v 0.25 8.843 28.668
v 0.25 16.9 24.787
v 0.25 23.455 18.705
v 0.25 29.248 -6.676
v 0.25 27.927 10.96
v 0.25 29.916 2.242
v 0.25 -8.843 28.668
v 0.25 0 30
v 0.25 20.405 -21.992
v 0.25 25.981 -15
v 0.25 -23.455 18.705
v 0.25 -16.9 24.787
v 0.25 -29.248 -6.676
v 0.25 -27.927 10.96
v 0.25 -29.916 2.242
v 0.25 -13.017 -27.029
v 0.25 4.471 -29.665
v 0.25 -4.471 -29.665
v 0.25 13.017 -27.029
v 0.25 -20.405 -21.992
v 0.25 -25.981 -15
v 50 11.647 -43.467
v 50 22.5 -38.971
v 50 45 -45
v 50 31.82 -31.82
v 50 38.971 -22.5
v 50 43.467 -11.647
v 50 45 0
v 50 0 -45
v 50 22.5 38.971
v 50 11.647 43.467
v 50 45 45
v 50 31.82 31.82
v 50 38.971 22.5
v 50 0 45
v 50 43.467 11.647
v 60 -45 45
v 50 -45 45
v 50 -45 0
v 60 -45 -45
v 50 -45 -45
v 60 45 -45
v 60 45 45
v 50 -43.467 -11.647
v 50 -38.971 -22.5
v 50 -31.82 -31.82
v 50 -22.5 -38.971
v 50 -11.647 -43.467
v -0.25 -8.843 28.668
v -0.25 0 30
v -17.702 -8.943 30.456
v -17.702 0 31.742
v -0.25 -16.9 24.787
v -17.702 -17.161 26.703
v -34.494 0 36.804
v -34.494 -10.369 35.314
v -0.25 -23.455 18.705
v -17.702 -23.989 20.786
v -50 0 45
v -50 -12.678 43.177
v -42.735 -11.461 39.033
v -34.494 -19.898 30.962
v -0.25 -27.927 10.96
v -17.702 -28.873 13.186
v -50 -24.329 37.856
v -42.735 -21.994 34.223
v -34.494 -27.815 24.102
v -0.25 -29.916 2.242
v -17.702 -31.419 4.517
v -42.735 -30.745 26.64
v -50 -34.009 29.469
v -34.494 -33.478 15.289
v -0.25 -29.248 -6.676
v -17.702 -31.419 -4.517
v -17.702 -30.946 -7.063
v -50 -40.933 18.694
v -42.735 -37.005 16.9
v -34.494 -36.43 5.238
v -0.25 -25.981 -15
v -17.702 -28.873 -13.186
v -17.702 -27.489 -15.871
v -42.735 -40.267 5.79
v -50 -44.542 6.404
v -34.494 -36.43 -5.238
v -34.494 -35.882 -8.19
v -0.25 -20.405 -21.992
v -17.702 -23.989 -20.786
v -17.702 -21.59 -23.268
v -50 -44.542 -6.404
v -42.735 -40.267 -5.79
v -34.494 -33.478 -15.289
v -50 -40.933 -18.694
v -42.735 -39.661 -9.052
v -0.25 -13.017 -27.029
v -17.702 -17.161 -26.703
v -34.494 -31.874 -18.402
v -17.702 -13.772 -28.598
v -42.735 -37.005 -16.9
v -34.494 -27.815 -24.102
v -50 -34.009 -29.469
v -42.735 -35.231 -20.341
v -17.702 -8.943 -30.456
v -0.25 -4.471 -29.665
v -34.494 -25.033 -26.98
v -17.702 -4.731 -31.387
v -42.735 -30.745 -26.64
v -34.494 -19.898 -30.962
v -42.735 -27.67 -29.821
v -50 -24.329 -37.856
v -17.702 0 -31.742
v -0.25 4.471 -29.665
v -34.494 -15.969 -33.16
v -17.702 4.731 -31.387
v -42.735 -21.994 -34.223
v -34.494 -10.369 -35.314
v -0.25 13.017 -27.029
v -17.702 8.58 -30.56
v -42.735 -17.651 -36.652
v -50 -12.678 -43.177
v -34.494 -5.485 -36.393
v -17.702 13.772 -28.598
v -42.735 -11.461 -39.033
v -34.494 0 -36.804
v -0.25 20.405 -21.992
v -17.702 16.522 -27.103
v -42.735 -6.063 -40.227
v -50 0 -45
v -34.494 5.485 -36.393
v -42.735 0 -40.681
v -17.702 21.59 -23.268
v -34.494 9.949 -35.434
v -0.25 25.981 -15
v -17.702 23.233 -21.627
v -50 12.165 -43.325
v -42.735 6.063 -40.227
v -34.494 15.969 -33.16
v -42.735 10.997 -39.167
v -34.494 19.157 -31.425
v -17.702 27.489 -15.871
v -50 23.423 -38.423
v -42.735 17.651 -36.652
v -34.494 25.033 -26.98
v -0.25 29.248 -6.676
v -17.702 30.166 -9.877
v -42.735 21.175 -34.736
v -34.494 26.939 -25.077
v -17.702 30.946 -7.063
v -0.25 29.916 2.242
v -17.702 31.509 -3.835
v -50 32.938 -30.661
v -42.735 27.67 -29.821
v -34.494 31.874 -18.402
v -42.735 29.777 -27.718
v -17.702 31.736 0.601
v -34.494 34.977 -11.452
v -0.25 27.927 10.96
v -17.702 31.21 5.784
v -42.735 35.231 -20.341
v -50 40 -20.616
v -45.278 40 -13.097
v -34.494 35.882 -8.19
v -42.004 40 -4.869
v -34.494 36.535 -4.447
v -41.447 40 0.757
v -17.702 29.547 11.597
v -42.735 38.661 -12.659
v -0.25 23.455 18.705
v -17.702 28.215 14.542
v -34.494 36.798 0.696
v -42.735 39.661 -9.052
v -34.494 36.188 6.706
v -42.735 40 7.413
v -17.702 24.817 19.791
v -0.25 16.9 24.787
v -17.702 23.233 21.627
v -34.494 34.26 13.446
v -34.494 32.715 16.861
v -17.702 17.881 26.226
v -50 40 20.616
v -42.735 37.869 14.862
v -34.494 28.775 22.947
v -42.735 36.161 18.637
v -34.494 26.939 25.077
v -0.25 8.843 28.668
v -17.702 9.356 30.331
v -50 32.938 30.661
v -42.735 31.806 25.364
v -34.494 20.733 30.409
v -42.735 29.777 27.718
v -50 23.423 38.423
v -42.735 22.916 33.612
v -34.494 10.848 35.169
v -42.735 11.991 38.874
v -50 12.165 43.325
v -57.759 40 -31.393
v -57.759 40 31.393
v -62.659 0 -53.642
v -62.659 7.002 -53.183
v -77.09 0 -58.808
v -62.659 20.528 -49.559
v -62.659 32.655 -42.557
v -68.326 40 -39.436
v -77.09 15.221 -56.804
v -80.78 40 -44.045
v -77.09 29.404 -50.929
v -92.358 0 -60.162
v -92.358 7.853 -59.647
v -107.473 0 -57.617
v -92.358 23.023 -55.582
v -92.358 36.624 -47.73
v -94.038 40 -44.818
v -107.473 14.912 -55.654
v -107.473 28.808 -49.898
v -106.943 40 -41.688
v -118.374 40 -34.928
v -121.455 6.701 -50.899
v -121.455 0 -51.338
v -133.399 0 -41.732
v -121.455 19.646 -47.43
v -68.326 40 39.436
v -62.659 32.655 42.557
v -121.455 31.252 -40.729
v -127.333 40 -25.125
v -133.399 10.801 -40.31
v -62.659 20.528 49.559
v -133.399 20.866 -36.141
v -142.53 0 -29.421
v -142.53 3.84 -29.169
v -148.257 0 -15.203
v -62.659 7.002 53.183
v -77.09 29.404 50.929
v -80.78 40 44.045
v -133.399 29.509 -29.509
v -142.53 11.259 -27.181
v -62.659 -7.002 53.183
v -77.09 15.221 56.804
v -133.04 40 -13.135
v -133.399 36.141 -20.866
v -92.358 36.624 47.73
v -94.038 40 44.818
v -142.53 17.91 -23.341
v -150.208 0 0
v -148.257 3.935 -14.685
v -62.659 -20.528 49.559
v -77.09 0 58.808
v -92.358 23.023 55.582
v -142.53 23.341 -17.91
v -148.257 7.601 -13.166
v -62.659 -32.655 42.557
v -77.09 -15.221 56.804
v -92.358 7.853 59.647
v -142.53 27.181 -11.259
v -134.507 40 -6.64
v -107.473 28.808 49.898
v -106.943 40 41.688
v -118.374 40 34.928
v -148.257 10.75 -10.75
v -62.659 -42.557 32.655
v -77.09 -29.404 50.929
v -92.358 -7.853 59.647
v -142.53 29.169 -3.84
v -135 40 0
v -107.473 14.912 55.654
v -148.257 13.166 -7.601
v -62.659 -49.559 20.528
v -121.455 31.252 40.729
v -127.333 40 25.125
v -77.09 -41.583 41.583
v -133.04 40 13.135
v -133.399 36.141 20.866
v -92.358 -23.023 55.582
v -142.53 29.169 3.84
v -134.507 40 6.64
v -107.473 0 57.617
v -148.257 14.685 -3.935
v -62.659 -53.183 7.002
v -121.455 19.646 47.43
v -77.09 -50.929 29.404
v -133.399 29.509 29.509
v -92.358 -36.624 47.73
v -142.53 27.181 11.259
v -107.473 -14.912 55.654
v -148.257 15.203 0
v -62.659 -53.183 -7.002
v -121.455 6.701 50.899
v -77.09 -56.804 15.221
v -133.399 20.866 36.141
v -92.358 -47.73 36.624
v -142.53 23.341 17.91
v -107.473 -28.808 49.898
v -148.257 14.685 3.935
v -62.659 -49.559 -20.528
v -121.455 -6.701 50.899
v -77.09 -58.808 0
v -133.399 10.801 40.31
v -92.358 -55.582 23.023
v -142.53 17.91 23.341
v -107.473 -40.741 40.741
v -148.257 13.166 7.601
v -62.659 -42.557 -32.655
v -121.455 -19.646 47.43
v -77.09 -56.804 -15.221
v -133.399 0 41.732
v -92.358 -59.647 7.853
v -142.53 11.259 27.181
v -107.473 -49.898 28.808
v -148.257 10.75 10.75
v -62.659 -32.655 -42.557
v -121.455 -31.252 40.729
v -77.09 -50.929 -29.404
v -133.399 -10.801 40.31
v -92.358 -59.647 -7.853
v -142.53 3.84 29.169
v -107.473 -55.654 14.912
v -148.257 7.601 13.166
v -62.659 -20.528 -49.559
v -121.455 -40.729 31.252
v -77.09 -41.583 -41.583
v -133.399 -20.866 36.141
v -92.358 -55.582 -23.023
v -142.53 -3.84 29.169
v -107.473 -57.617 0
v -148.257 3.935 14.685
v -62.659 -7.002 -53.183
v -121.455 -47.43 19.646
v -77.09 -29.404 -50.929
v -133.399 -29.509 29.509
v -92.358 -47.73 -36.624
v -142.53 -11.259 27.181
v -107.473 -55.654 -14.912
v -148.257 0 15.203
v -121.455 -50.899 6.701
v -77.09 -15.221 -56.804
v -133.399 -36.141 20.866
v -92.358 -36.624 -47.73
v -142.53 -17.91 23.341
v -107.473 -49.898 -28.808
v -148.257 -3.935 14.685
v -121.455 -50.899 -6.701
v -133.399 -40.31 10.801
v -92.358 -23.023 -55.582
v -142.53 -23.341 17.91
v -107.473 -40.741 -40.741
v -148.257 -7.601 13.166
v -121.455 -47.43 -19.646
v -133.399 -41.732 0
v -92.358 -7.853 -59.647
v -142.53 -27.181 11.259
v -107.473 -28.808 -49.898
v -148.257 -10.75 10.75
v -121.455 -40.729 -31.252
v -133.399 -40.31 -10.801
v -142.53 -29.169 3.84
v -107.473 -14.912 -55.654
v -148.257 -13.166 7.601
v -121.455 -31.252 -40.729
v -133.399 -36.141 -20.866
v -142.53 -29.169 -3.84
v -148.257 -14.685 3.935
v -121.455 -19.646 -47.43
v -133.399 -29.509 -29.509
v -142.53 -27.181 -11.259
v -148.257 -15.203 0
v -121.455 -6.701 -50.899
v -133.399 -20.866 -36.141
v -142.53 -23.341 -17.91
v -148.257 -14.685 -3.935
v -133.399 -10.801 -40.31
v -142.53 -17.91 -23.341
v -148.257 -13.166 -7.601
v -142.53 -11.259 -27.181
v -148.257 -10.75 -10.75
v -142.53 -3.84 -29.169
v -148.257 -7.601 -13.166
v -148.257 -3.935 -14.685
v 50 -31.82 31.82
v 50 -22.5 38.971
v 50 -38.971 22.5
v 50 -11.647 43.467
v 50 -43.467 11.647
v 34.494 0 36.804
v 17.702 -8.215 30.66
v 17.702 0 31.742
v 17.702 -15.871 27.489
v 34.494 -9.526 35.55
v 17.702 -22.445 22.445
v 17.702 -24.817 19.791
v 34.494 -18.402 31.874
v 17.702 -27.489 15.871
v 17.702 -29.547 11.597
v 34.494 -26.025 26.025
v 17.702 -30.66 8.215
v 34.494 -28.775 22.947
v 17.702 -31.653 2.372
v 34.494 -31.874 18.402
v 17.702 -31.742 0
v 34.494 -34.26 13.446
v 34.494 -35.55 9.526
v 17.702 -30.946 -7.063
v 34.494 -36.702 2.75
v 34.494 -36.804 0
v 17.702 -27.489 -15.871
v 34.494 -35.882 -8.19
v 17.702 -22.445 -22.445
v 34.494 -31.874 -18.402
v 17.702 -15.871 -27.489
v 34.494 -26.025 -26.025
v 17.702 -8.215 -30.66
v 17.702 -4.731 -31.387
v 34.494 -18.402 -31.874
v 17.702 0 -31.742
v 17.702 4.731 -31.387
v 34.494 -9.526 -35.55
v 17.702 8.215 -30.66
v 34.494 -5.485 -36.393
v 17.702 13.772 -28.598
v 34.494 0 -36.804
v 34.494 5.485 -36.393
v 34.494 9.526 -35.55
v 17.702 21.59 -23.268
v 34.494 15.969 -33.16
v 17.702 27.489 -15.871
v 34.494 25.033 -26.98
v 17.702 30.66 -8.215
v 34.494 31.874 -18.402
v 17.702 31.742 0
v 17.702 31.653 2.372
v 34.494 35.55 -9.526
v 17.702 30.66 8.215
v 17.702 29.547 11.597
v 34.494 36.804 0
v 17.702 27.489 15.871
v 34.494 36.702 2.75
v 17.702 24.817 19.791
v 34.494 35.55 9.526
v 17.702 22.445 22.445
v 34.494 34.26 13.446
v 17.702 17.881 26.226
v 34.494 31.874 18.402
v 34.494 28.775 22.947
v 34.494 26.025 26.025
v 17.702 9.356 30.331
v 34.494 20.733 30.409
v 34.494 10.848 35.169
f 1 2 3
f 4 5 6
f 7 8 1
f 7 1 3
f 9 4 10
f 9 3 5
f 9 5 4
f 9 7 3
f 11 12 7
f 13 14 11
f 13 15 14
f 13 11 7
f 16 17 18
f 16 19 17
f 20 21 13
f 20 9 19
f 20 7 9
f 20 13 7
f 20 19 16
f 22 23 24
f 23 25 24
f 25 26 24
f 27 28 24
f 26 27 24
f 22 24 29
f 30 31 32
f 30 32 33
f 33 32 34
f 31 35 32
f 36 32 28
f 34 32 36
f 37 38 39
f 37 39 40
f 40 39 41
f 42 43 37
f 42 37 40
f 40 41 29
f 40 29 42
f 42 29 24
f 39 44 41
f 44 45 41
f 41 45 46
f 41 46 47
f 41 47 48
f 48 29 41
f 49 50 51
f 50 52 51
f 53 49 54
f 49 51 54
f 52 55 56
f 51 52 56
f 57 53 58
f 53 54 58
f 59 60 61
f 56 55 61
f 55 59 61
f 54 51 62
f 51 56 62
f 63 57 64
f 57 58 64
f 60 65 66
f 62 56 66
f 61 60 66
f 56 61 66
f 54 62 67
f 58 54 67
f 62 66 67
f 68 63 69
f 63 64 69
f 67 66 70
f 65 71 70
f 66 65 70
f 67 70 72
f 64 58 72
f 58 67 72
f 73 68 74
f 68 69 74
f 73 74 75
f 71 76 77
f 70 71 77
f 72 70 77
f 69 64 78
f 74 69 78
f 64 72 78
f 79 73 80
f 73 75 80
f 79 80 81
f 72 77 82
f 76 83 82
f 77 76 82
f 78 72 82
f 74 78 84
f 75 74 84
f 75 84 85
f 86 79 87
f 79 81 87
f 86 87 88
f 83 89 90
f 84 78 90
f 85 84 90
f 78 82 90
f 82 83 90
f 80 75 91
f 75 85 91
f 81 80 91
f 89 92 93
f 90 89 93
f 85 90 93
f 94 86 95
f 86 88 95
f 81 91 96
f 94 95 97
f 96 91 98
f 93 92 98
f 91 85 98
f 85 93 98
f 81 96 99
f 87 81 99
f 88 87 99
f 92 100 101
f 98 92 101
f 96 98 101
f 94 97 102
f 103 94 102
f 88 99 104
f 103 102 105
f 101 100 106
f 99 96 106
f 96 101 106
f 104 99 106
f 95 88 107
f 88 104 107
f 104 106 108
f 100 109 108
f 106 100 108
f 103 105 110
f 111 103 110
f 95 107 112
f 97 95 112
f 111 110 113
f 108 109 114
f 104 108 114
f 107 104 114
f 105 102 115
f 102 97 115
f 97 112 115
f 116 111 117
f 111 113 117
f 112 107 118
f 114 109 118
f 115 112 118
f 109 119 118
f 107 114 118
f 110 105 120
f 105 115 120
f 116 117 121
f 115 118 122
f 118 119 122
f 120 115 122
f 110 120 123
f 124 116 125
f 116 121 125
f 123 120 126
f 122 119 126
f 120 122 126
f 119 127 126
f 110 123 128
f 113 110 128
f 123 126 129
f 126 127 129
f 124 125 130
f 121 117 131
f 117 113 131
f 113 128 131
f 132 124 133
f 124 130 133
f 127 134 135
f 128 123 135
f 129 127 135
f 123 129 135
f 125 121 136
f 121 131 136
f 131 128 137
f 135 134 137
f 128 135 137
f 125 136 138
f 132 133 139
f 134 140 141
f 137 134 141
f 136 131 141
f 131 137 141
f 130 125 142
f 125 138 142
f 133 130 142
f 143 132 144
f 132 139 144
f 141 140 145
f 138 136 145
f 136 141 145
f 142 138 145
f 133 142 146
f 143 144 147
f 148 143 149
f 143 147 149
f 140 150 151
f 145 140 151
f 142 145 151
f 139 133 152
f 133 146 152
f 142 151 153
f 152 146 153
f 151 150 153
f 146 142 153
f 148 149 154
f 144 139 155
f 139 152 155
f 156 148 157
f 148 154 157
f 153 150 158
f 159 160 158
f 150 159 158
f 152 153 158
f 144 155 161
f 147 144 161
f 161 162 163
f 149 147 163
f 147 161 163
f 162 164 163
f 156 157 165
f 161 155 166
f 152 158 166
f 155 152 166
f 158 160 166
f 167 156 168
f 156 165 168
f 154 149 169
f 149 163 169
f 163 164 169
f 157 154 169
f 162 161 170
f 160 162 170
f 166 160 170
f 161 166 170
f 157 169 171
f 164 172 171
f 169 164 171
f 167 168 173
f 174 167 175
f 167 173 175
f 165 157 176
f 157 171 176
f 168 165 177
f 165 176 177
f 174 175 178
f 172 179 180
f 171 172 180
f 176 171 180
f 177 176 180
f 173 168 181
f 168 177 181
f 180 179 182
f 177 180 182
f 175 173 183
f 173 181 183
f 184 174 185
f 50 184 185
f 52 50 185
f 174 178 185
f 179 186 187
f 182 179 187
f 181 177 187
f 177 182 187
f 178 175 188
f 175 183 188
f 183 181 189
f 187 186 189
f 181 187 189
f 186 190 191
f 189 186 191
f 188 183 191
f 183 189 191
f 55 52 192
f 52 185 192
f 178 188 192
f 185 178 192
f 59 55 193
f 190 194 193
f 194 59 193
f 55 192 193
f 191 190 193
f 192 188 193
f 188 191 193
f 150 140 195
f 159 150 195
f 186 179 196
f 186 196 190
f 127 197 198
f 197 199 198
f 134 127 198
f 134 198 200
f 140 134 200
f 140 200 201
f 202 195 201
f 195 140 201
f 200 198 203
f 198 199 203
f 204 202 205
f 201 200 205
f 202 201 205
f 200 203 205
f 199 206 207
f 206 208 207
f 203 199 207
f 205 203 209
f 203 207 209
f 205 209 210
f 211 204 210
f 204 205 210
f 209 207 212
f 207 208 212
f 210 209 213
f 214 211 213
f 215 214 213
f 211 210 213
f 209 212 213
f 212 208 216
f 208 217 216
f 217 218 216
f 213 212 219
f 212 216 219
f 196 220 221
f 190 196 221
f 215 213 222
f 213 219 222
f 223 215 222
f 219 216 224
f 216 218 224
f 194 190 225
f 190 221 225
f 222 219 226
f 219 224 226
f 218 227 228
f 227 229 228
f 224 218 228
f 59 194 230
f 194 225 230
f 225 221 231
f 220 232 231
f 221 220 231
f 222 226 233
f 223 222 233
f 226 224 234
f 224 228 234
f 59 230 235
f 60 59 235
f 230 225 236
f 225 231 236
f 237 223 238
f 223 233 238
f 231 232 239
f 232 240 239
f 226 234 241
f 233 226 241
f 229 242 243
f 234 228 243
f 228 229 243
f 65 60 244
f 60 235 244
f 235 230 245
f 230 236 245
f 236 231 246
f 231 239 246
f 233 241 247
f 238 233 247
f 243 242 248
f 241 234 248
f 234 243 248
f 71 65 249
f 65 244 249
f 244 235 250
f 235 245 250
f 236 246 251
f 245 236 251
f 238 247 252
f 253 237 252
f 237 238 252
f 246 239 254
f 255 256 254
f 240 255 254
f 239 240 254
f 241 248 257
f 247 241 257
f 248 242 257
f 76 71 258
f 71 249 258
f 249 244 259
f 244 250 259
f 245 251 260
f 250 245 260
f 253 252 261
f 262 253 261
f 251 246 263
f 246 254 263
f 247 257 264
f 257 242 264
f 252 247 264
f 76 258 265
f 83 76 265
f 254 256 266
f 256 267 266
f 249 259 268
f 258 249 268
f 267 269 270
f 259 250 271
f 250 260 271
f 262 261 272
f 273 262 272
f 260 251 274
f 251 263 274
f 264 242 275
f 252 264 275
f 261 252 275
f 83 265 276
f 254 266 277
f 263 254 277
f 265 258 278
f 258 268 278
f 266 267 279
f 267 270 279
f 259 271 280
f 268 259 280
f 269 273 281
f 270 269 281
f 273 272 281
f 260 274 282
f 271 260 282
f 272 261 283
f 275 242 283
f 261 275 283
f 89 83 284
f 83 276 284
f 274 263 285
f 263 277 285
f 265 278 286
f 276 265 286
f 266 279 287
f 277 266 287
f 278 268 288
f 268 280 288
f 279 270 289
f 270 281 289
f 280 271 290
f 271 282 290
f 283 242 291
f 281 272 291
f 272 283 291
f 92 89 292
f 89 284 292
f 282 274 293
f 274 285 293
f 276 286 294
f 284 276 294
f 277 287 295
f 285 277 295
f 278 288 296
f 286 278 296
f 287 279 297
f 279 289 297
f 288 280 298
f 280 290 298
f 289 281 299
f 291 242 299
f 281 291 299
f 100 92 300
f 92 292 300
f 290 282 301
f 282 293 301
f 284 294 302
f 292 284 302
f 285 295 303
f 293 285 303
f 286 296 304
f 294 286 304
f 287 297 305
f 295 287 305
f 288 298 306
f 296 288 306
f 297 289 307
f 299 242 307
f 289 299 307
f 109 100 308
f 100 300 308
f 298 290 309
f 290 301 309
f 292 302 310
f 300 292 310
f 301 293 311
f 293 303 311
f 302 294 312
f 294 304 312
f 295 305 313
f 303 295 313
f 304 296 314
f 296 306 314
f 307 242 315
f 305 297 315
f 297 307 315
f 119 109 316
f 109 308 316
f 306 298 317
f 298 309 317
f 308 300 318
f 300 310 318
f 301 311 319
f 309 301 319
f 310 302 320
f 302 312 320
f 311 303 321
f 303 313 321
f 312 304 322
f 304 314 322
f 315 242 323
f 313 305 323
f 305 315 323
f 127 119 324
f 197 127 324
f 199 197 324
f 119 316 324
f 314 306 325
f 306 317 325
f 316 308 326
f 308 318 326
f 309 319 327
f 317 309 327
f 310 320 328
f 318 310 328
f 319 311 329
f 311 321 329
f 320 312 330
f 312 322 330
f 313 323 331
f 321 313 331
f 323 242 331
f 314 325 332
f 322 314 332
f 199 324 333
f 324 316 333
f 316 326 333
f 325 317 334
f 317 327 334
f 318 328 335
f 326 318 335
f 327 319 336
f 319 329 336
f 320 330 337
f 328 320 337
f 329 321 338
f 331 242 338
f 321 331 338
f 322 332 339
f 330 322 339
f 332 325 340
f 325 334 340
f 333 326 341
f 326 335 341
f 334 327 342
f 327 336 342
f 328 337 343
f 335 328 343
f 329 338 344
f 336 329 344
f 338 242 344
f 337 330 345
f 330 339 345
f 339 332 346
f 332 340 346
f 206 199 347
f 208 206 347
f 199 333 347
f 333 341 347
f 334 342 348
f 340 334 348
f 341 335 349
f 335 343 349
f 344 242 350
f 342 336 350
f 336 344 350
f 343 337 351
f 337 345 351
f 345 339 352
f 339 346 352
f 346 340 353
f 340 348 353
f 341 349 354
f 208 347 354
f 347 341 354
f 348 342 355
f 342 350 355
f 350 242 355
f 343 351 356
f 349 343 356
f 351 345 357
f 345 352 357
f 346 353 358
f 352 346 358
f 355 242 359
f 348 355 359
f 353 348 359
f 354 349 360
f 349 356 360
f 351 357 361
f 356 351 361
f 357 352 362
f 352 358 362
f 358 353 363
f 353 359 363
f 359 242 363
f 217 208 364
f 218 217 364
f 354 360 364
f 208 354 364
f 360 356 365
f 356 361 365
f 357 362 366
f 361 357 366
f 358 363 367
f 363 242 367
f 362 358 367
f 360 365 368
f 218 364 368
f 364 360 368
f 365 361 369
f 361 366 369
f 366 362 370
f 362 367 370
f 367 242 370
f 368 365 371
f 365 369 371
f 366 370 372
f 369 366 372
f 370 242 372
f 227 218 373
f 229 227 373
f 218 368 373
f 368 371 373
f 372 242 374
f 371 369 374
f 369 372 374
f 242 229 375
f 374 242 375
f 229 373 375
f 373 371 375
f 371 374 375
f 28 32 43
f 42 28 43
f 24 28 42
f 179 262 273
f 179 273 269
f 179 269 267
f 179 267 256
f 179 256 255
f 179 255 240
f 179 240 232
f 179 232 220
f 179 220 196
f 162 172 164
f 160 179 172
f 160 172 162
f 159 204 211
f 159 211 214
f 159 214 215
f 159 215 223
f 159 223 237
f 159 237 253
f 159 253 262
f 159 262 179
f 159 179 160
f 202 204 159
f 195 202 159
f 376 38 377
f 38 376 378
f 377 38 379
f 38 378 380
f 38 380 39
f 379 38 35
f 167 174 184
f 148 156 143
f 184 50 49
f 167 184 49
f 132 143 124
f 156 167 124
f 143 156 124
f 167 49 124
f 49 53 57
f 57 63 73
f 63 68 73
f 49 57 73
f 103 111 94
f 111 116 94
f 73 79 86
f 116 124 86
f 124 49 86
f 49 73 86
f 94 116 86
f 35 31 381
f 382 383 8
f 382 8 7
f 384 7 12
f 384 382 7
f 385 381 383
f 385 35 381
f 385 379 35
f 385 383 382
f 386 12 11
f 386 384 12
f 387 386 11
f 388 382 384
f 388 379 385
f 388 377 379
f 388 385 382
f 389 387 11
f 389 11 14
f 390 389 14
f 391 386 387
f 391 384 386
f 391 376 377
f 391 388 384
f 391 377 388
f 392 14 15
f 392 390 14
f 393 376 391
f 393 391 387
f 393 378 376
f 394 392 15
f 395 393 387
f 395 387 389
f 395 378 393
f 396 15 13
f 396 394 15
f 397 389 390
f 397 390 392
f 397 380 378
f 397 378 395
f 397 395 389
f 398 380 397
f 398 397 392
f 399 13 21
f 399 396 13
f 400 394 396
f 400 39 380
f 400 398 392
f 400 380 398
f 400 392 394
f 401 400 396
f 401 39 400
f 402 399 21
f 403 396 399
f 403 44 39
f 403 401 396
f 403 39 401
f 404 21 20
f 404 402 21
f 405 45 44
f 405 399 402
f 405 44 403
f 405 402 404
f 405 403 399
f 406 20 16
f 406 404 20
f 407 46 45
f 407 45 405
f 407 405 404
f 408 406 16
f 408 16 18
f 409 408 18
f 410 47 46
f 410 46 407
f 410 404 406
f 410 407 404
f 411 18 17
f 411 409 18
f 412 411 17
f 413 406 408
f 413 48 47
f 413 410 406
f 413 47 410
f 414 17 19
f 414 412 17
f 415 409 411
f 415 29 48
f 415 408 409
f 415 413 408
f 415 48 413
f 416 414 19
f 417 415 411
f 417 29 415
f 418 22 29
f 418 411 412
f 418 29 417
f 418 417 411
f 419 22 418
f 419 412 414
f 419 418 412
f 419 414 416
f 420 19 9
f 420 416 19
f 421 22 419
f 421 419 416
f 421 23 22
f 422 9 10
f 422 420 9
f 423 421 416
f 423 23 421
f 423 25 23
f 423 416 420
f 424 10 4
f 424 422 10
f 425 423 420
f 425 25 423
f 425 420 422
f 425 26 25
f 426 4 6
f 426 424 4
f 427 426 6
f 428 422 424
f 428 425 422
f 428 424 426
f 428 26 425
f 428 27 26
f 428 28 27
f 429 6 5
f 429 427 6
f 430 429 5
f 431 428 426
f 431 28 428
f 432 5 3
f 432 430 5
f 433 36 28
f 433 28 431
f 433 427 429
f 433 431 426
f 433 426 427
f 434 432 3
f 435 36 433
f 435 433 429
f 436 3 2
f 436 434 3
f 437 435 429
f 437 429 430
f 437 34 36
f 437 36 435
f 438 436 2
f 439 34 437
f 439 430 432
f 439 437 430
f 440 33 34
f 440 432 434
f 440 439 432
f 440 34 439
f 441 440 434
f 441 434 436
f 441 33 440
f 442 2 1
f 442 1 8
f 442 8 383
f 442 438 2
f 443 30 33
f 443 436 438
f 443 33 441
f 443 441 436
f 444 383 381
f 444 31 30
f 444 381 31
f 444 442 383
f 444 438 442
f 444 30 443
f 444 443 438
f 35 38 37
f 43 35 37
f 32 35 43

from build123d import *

# Parameters (mm, degrees)
SKETCH3_W               = 90
SKETCH3_H               = 90
BOSS_EXTRUDE1_DEPTH     = 10
CUT_EXTRUDE1_DEPTH      = 20
CUT_EXTRUDE1_DEPTH_BACK = 20
SKETCH7_W               = 132.063759526
SKETCH7_H               = 133.30964405


with BuildPart() as part:
    # Sketch2 → Revolve1 (revolve)
    with BuildSketch(Plane(origin=(0, 0, 0), x_dir=(1, 0, 0), z_dir=(0, 1, 0))):
        with BuildLine():
            Line((-50, 0), (-0.25, 0))
            Line((-0.25, 0), (-0.25, 30.000344037))
            ThreePointArc((-0.25, 30.000344037), (-26.220469957, 33.866779994), (-50, 45))
            Line((-50, 45), (-50, 0))
        make_face()
        with BuildLine():
            Line((50, 45), (50, 0))
            Line((50, 0), (0.25, 0))
            Line((0.25, 0), (0.25, 30.000344037))
            ThreePointArc((0.25, 30.000344037), (26.220469957, 33.866779994), (50, 45))
        make_face()
    revolve(axis=Axis((-50, 0, 0), (1, 0, 0)))

    # Sketch3 → Boss-Extrude1 (add)
    with BuildSketch(Plane(origin=(50, 0, 0), x_dir=(0, 0, -1), z_dir=(1, 0, 0))):
        Rectangle(SKETCH3_W, SKETCH3_H)
    extrude(amount=BOSS_EXTRUDE1_DEPTH)

    # Sketch5 → Revolve8 (revolve)
    with BuildSketch(Plane(origin=(0, 0, 0), x_dir=(1, 0, 0), z_dir=(0, 1, 0))):
        with BuildLine():
            Line((-150.207972894, 0), (-29.792027106, 0))
            ThreePointArc((-29.792027106, 0), (-90, 60.207972894), (-150.207972894, 0))
        make_face()
    revolve(axis=Axis((-150.207972894, 0, 0), (1, 0, 0)))

    # Sketch7 → Cut-Extrude1 (cut, two sides: drawn at the far end of the back side and taken through both)
    with BuildSketch(Plane(origin=(0, 60, 0), x_dir=(1, 0, 0), z_dir=(0, 1, 0)).offset(-CUT_EXTRUDE1_DEPTH_BACK)):
        with Locations((-91.700067638, 0)):
            Rectangle(SKETCH7_W, SKETCH7_H)
    extrude(amount=CUT_EXTRUDE1_DEPTH + CUT_EXTRUDE1_DEPTH_BACK, mode=Mode.SUBTRACT)


solid = part.part
